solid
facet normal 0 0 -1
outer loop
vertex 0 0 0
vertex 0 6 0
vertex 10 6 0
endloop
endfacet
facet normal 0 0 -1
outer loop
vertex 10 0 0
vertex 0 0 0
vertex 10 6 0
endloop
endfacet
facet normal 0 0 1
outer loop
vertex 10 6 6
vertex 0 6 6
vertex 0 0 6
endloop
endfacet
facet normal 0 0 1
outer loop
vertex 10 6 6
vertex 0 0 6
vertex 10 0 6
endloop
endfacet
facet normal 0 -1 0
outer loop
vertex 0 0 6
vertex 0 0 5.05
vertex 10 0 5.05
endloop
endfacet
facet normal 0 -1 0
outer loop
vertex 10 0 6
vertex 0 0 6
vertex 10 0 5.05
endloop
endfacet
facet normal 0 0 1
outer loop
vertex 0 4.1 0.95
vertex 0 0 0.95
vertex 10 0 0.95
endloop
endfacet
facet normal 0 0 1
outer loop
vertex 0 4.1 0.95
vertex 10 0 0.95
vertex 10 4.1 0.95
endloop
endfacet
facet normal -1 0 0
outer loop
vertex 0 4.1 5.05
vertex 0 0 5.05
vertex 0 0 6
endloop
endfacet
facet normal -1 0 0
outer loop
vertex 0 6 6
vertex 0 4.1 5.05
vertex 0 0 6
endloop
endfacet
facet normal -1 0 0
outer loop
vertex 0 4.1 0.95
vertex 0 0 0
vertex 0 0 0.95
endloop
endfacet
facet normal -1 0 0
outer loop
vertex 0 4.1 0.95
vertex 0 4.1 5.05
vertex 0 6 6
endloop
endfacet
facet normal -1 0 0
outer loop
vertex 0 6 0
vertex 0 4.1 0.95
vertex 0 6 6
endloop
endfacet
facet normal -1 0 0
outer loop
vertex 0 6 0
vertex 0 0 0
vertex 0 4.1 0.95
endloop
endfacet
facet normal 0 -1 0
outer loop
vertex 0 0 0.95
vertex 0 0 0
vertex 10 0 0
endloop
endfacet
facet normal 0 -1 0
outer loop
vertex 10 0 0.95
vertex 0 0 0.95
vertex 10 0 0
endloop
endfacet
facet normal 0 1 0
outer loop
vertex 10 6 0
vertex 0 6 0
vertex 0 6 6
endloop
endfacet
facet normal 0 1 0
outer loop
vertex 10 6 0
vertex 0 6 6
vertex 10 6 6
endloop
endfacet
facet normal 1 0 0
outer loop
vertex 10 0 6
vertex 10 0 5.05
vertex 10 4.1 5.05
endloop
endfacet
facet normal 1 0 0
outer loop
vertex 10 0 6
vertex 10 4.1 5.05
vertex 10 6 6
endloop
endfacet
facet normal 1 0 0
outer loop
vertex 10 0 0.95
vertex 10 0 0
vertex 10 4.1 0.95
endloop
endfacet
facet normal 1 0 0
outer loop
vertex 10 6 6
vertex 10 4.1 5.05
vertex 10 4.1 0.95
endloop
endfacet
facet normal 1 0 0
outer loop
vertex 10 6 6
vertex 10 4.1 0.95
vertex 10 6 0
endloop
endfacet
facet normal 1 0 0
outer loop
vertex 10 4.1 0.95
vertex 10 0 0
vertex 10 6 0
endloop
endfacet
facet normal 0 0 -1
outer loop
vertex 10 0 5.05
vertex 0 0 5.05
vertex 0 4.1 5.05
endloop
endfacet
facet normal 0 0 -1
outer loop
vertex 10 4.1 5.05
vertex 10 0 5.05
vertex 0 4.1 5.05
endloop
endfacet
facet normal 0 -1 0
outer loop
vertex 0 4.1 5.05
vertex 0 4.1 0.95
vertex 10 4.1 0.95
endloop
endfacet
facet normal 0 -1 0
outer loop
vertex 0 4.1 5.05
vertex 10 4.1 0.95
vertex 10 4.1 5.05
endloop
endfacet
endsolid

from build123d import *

# Parameters (mm, degrees)
F0_W     = 10
F0_H     = 6
F1_DEPTH = 6
F2_W     = 4.1
F2_H     = 4.1
F3_DEPTH = 10


with BuildPart() as f1:
    # F0 (on Top) → F1 (new body)
    with BuildSketch(Plane.XY):
        with Locations((5, 3)):
            Rectangle(F0_W, F0_H)
    extrude(amount=F1_DEPTH)

    # F2 (on face) → F3 (cut, through all)
    with BuildSketch(Plane.YZ.offset(10)):
        with Locations((2.05, 3)):
            Rectangle(F2_W, F2_H)
    extrude(amount=-F3_DEPTH, mode=Mode.SUBTRACT)


solid = f1.part
